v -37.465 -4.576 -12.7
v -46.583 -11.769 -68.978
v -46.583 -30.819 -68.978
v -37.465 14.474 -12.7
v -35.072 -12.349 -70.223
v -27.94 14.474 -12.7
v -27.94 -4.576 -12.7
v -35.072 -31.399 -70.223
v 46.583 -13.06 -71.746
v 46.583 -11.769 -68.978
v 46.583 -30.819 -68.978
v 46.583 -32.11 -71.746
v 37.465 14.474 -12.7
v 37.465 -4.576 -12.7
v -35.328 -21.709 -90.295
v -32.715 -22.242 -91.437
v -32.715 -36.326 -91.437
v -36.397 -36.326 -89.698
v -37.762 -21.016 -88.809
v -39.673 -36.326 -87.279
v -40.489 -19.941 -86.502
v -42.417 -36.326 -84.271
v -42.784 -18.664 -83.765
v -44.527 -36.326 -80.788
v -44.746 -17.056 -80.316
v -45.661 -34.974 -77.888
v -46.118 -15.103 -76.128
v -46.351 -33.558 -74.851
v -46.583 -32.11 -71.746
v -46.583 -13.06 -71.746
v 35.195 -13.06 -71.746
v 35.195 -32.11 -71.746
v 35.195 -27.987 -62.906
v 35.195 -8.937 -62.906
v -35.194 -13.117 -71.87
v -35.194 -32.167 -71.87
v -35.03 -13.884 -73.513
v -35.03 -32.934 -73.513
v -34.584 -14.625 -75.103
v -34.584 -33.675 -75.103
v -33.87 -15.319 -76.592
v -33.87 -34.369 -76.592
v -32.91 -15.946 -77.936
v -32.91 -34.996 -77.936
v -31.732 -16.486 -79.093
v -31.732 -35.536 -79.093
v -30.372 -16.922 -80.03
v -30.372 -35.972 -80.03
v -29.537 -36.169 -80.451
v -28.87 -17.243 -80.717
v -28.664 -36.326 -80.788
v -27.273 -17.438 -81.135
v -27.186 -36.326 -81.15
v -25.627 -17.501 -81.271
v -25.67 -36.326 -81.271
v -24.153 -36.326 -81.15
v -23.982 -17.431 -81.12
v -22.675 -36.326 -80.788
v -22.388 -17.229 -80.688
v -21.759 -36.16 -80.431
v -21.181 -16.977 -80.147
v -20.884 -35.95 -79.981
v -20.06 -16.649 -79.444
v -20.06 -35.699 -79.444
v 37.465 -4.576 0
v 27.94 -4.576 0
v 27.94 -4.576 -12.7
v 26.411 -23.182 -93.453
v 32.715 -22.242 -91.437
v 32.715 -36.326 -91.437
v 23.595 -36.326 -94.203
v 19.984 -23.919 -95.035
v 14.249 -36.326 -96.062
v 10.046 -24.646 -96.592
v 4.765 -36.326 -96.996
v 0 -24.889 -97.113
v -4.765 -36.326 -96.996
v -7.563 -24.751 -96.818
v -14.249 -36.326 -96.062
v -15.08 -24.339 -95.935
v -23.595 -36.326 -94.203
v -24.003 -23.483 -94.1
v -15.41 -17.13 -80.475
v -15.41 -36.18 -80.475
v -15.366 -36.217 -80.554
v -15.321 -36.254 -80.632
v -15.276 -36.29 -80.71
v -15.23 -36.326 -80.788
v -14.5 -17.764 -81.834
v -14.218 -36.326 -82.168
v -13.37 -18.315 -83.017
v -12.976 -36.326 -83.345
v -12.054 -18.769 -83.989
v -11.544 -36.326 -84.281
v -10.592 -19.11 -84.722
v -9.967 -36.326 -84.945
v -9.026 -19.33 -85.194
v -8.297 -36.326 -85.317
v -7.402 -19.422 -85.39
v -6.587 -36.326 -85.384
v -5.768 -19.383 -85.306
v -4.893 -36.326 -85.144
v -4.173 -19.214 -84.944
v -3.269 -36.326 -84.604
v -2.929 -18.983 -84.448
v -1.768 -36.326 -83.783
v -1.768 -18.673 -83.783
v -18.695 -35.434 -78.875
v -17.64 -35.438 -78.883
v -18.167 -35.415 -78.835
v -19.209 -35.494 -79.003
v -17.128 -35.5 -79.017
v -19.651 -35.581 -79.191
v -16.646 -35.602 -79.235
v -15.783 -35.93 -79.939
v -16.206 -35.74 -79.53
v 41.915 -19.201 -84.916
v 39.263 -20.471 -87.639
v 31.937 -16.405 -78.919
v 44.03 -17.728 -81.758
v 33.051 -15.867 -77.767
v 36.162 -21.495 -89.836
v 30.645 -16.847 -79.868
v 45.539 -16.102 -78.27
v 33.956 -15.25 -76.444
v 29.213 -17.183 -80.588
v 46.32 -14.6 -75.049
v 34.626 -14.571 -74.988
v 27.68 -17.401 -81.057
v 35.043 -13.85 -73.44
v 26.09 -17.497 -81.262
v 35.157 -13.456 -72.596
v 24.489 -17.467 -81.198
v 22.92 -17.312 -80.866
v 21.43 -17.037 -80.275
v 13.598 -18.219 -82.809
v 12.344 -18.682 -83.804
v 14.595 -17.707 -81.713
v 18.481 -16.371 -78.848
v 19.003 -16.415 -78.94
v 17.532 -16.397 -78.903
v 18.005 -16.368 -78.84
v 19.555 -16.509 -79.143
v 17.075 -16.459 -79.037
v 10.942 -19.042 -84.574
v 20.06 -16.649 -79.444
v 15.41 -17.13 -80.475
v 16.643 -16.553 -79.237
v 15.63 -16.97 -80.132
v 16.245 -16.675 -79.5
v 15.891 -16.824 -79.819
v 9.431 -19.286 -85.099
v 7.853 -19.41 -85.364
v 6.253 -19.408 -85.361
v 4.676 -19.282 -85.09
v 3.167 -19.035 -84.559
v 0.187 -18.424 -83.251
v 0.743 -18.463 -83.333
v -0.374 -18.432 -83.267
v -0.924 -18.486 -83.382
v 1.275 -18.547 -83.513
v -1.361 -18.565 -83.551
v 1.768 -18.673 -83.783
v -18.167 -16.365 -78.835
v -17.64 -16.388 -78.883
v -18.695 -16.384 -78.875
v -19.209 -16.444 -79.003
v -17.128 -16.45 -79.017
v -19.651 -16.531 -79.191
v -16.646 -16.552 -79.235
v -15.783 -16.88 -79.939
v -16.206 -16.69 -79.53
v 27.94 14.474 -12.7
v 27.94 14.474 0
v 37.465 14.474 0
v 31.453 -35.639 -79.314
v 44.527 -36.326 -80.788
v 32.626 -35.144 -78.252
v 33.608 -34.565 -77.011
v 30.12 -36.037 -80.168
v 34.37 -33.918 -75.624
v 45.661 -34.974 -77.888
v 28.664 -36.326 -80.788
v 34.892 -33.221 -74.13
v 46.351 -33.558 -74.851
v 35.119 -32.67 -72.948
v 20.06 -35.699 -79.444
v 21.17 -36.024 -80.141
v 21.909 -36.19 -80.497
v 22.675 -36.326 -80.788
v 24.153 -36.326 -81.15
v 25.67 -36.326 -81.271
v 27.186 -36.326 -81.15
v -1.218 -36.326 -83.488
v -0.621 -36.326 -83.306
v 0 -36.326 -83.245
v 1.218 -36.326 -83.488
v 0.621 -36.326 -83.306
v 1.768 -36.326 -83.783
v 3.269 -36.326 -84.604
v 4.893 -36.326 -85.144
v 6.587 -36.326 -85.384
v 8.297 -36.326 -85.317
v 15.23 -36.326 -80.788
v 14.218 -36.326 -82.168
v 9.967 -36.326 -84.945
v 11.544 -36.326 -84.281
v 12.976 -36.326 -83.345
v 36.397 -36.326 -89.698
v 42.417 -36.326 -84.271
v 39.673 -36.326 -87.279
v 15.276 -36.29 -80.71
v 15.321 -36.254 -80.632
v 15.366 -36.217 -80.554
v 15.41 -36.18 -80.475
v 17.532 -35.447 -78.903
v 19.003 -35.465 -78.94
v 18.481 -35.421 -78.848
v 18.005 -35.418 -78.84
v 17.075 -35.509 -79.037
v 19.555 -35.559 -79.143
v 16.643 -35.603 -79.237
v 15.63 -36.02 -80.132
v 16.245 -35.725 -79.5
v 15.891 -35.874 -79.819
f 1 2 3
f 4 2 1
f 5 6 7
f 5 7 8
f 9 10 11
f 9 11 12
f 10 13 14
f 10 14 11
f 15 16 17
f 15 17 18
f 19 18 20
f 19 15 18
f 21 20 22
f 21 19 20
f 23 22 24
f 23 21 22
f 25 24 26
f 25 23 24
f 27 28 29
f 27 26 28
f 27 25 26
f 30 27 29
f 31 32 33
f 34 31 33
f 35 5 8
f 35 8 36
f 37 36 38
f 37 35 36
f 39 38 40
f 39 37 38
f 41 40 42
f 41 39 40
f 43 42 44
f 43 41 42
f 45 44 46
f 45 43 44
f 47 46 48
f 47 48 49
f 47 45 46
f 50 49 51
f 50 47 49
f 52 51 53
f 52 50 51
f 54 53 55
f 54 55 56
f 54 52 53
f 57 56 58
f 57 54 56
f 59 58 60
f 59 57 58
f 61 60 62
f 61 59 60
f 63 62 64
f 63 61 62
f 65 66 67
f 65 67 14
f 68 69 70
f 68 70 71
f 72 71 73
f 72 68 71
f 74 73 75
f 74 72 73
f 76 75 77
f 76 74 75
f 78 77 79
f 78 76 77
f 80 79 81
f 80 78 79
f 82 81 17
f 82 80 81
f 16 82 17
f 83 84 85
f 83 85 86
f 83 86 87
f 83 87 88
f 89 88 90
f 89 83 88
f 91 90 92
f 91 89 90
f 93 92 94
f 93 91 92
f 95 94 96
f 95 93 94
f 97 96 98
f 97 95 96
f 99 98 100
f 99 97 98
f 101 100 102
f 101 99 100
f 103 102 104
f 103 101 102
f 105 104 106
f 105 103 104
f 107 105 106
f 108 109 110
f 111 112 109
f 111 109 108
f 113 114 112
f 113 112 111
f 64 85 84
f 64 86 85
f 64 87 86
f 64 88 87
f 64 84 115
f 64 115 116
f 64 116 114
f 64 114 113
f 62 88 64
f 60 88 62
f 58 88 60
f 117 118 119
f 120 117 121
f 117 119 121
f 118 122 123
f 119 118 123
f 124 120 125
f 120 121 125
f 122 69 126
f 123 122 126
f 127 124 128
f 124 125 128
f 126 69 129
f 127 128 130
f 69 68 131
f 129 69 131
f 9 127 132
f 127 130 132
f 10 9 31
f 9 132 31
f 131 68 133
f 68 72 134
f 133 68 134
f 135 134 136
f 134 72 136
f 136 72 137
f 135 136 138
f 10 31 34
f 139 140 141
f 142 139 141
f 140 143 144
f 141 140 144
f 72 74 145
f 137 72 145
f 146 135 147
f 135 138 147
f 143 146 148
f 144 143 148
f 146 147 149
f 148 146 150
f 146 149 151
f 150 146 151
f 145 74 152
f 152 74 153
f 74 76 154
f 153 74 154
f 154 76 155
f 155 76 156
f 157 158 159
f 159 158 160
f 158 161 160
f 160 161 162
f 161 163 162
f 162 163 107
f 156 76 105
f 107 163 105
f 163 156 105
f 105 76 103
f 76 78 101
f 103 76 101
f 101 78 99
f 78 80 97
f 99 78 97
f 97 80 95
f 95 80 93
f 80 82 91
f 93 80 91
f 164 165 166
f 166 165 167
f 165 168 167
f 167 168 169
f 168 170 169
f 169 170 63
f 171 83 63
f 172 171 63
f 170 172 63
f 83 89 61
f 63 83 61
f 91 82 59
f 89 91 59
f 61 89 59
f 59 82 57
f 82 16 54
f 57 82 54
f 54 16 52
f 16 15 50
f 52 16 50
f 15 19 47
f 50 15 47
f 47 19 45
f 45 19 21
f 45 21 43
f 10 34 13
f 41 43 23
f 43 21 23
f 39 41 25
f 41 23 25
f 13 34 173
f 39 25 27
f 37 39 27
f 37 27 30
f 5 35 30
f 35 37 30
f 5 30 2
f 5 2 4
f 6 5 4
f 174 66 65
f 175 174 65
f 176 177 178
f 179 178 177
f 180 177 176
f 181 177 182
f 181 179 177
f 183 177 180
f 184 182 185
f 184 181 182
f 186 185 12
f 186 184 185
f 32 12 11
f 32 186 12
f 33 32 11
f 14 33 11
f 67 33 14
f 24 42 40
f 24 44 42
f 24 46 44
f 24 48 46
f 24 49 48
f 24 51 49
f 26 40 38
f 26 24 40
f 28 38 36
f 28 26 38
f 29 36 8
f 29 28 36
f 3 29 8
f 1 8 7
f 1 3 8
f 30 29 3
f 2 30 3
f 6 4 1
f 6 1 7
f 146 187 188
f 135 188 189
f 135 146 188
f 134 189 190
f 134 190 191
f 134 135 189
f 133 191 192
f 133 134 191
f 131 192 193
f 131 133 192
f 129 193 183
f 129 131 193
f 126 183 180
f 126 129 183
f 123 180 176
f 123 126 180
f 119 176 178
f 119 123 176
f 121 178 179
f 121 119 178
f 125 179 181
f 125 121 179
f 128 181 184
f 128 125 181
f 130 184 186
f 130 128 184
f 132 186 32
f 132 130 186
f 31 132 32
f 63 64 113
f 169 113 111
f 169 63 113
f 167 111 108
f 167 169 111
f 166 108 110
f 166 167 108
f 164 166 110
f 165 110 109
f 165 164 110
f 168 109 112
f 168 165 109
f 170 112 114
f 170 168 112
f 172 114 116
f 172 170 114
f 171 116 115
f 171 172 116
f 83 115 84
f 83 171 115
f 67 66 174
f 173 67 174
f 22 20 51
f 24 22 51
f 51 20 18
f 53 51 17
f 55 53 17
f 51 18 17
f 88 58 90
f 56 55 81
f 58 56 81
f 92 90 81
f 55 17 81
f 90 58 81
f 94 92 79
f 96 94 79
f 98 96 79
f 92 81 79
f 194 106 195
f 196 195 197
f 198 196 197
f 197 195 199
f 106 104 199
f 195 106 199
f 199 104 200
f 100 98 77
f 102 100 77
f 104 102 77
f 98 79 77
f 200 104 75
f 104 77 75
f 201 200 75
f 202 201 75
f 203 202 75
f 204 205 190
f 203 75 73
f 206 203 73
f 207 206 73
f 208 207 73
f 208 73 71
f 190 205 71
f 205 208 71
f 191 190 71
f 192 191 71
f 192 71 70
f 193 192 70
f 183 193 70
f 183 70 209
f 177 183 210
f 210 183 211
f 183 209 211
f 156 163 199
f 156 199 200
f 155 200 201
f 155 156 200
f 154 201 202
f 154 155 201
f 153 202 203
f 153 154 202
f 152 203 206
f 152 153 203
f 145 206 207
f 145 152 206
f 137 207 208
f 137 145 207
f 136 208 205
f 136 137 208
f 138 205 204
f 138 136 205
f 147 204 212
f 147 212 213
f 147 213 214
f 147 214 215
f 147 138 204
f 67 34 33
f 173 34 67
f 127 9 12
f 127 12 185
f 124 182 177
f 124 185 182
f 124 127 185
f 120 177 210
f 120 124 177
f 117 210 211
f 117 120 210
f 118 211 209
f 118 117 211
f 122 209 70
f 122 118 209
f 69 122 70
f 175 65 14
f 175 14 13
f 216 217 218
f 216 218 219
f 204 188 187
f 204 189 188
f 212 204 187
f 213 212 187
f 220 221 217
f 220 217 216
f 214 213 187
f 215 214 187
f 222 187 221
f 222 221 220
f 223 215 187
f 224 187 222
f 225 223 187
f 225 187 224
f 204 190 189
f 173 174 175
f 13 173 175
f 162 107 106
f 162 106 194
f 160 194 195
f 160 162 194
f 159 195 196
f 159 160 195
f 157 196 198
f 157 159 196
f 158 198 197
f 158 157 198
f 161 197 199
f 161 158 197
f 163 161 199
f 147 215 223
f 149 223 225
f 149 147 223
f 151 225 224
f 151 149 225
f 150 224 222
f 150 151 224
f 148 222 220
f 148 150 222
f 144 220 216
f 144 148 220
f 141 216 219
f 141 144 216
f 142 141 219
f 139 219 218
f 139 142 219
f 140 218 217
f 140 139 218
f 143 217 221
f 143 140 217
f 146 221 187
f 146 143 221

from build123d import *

# Parameters (mm, degrees)
SKETCH1_W               = 9.525
SKETCH1_H               = 19.05
BOSS_EXTRUDE1_DEPTH     = 12.7
BOSS_EXTRUDE2_DEPTH     = 50.8
CUT_EXTRUDE1_DEPTH      = 114.668287772
CUT_EXTRUDE1_DEPTH_BACK = 114.668287772


with BuildPart() as part:
    # Sketch1 → Boss-Extrude1 (new body)
    with BuildSketch(Plane.XY):
        with Locations((32.7025, 4.948874545)):
            Rectangle(SKETCH1_W, SKETCH1_H)
    extrude(amount=-BOSS_EXTRUDE1_DEPTH)

    # Sketch2 → Boss-Extrude2 (add)
    with BuildSketch(Plane(origin=(0, 14.473874545, 0), x_dir=(1, 0, 0), z_dir=(0, 1, 0))):
        with BuildLine():
            ThreePointArc((46.582827663, 71.746075344), (42.767883123, 83.788084157), (32.714892878, 91.436689602))
            ThreePointArc((32.714892878, 91.436689602), (0, 97.112987913), (-32.714892878, 91.436689602))
            ThreePointArc((-32.714892878, 91.436689602), (-42.767883123, 83.788084157), (-46.582827663, 71.746075344))
            Line((-46.582827663, 71.746075344), (-46.582827663, 68.977736354))
            Line((-46.582827663, 68.977736354), (-37.465, 12.7))
            Line((-37.465, 12.7), (-27.94, 12.7))
            Line((-27.94, 12.7), (-35.072238217, 70.222747392))
            ThreePointArc((-35.072238217, 70.222747392), (-30.65501556, 79.862333542), (-20.059817821, 79.443690492))
            ThreePointArc((-20.059817821, 79.443690492), (-17.502300297, 78.909892112), (-15.410312677, 80.474955814))
            ThreePointArc((-15.410312677, 80.474955814), (-9.316307054, 85.127912481), (-1.767954793, 83.782814559))
            ThreePointArc((-1.767954793, 83.782814559), (0, 83.245040535), (1.767954793, 83.782814559))
            ThreePointArc((1.767954793, 83.782814559), (9.316307054, 85.127912481), (15.410312677, 80.474955814))
            ThreePointArc((15.410312677, 80.474955814), (17.502300297, 78.909892112), (20.059817821, 79.443690492))
            ThreePointArc((20.059817821, 79.443690492), (29.98783501, 80.23610137), (35.194839749, 71.746075344))
            Line((35.194839749, 71.746075344), (35.194839749, 62.905769869))
            Line((35.194839749, 62.905769869), (27.94, 12.7))
            Line((27.94, 12.7), (37.465, 12.7))
            Line((37.465, 12.7), (46.582827663, 68.977736354))
            Line((46.582827663, 68.977736354), (46.582827663, 71.746075344))
        make_face()
    extrude(amount=-BOSS_EXTRUDE2_DEPTH)

    # Sketch3 → Cut-Extrude1 (cut, two sides: drawn at the far end of the back side and taken through both)
    with BuildSketch(Plane(origin=(0, 0, 0), x_dir=(0, 0, -1), z_dir=(1, 0, 0)).offset(-CUT_EXTRUDE1_DEPTH_BACK)):
        Polygon((80.788094726, -36.326125455), (12.7, -4.576125455), (12.7, -36.326125455), align=None)
        Polygon((97.112987913, -24.888548166), (12.7, 14.473874545), (97.112987913, 14.473874545), align=None)
    extrude(amount=CUT_EXTRUDE1_DEPTH + CUT_EXTRUDE1_DEPTH_BACK, mode=Mode.SUBTRACT)


solid = part.part
